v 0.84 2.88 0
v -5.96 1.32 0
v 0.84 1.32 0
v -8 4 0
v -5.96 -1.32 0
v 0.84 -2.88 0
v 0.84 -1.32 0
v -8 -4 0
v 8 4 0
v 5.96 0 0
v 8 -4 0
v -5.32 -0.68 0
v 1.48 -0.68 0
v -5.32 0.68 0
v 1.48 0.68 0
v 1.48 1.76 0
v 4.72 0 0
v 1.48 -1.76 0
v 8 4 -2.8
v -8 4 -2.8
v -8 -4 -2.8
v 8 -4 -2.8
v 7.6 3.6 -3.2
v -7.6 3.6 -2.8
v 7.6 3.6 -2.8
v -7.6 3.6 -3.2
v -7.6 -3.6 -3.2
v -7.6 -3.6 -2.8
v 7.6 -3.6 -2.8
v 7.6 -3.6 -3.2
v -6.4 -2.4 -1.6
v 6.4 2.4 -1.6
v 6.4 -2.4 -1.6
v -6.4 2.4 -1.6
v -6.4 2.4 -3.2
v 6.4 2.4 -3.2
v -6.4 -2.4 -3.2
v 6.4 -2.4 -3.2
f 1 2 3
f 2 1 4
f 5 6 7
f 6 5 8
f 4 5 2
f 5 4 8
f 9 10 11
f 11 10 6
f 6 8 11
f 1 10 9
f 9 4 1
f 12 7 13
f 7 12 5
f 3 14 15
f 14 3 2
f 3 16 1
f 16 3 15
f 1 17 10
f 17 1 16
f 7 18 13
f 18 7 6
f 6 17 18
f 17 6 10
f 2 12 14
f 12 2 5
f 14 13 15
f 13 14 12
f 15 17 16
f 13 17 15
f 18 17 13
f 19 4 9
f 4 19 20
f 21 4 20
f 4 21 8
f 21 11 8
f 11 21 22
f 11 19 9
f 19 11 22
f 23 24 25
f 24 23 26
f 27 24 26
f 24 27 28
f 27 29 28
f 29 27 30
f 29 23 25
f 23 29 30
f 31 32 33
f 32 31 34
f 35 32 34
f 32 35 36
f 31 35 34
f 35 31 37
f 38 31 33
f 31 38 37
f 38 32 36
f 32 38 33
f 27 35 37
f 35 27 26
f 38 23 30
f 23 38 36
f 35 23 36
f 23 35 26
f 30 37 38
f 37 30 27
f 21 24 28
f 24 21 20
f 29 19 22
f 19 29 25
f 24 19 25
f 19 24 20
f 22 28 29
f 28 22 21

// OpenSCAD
// file: ../p/box5.scad
use <../lib.scad>
function ldraw_lib__box5() = [
// 0 Box with 5 Faces and All Edges
// 0 Name: box5.dat
// 0 Author: James Jessiman
// 0 !LDRAW_ORG Primitive UPDATE 2012-01
// 0 !LICENSE Licensed under CC BY 4.0 : see CAreadme.txt
// 
// 0 BFC CERTIFY CCW
  [0,"BFC","CERTIFY"],
  [0,"BFC","CCW"],
// 
// 0 !HISTORY 2002-04-03 [sbliss] Modified for BFC compliance
// 0 !HISTORY 2002-04-25 [PTadmin] Official Update 2002-02
// 0 !HISTORY 2007-06-24 [PTadmin] Header formatted for Contributor Agreement
// 0 !HISTORY 2008-07-01 [PTadmin] Official Update 2008-01
// 0 !HISTORY 2012-02-16 [Philo] Changed to CCW
// 0 !HISTORY 2012-03-30 [PTadmin] Official Update 2012-01
// 
// 
// 2 24 1 1 1 -1 1 1
  [2,24,1,1,1,-1,1,1],
// 2 24 -1 1 1 -1 1 -1
  [2,24,-1,1,1,-1,1,-1],
// 2 24 -1 1 -1 1 1 -1
  [2,24,-1,1,-1,1,1,-1],
// 2 24 1 1 -1 1 1 1
  [2,24,1,1,-1,1,1,1],
// 2 24 1 0 1 -1 0 1
  [2,24,1,0,1,-1,0,1],
// 2 24 -1 0 1 -1 0 -1
  [2,24,-1,0,1,-1,0,-1],
// 2 24 -1 0 -1 1 0 -1
  [2,24,-1,0,-1,1,0,-1],
// 2 24 1 0 -1 1 0 1
  [2,24,1,0,-1,1,0,1],
// 2 24 1 0 1 1 1 1
  [2,24,1,0,1,1,1,1],
// 2 24 -1 0 1 -1 1 1
  [2,24,-1,0,1,-1,1,1],
// 2 24 1 0 -1 1 1 -1
  [2,24,1,0,-1,1,1,-1],
// 2 24 -1 0 -1 -1 1 -1
  [2,24,-1,0,-1,-1,1,-1],
// 4 16 -1 1 1 1 1 1 1 1 -1 -1 1 -1
  [4,16,-1,1,1,1,1,1,1,1,-1,-1,1,-1],
// 4 16 -1 1 1 -1 0 1 1 0 1 1 1 1
  [4,16,-1,1,1,-1,0,1,1,0,1,1,1,1],
// 4 16 -1 1 -1 -1 0 -1 -1 0 1 -1 1 1
  [4,16,-1,1,-1,-1,0,-1,-1,0,1,-1,1,1],
// 4 16 1 1 -1 1 0 -1 -1 0 -1 -1 1 -1
  [4,16,1,1,-1,1,0,-1,-1,0,-1,-1,1,-1],
// 4 16 1 1 1 1 0 1 1 0 -1 1 1 -1
  [4,16,1,1,1,1,0,1,1,0,-1,1,1,-1],
];
module ldraw_lib__box5(step=0, col=false, unit=2/5, alt=false, line=0.2, solid=!$preview)
    makepoly(ldraw_lib__box5(), step=step, col=col, unit=unit, alt=alt, line=line, solid=solid);
ldraw_lib__box5(line=0.2);
// file: ../p/box4.scad
use <../lib.scad>
function ldraw_lib__box4() = [
// 0 Box with 4 Faces (2 Parallel Pairs) and All Edges
// 0 Name: box4.dat
// 0 Author: James Jessiman
// 0 !LDRAW_ORG Primitive UPDATE 2012-01
// 0 !LICENSE Licensed under CC BY 4.0 : see CAreadme.txt
// 
// 0 BFC CERTIFY CCW
  [0,"BFC","CERTIFY"],
  [0,"BFC","CCW"],
// 
// 0 !HISTORY 2002-04-03 [sbliss] Modified for BFC compliance
// 0 !HISTORY 2002-04-25 [PTadmin] Official Update 2002-02
// 0 !HISTORY 2007-06-24 [PTadmin] Header formatted for Contributor Agreement
// 0 !HISTORY 2008-07-01 [PTadmin] Official Update 2008-01
// 0 !HISTORY 2012-02-16 [Philo] Changed to CCW
// 0 !HISTORY 2012-03-30 [PTadmin] Official Update 2012-01
// 
// 
// 2 24 1 1 1 -1 1 1
  [2,24,1,1,1,-1,1,1],
// 2 24 -1 1 1 -1 1 -1
  [2,24,-1,1,1,-1,1,-1],
// 2 24 -1 1 -1 1 1 -1
  [2,24,-1,1,-1,1,1,-1],
// 2 24 1 1 -1 1 1 1
  [2,24,1,1,-1,1,1,1],
// 2 24 1 0 1 -1 0 1
  [2,24,1,0,1,-1,0,1],
// 2 24 -1 0 1 -1 0 -1
  [2,24,-1,0,1,-1,0,-1],
// 2 24 -1 0 -1 1 0 -1
  [2,24,-1,0,-1,1,0,-1],
// 2 24 1 0 -1 1 0 1
  [2,24,1,0,-1,1,0,1],
// 2 24 1 0 1 1 1 1
  [2,24,1,0,1,1,1,1],
// 2 24 -1 0 1 -1 1 1
  [2,24,-1,0,1,-1,1,1],
// 2 24 1 0 -1 1 1 -1
  [2,24,1,0,-1,1,1,-1],
// 2 24 -1 0 -1 -1 1 -1
  [2,24,-1,0,-1,-1,1,-1],
// 4 16 -1 1 1 -1 0 1 1 0 1 1 1 1
  [4,16,-1,1,1,-1,0,1,1,0,1,1,1,1],
// 4 16 -1 1 -1 -1 0 -1 -1 0 1 -1 1 1
  [4,16,-1,1,-1,-1,0,-1,-1,0,1,-1,1,1],
// 4 16 1 1 -1 1 0 -1 -1 0 -1 -1 1 -1
  [4,16,1,1,-1,1,0,-1,-1,0,-1,-1,1,-1],
// 4 16 1 1 1 1 0 1 1 0 -1 1 1 -1
  [4,16,1,1,1,1,0,1,1,0,-1,1,1,-1],
];
module ldraw_lib__box4(step=0, col=false, unit=2/5, alt=false, line=0.2, solid=!$preview)
    makepoly(ldraw_lib__box4(), step=step, col=col, unit=unit, alt=alt, line=line, solid=solid);
ldraw_lib__box4(line=0.2);
// file: s/3069p06c.scad
use <../../lib.scad>
function ldraw_lib__s__3069p06c() = [
// 0 ~Tile  1 x  2 with Arrow Long Pattern (Arrow)
// 0 Name: s\3069p06c.dat
// 0 Author: William Howard [WilliamH]
// 0 !LDRAW_ORG Subpart UPDATE 2009-03
// 0 !LICENSE Licensed under CC BY 2.0 and CC BY 4.0 : see CAreadme.txt
// 
// 0 BFC CERTIFY CCW
  [0,"BFC","CERTIFY"],
  [0,"BFC","CCW"],
// 
// 0 !HISTORY 2009-05-02 [PTadmin] Official Update 2009-01
// 0 !HISTORY 2009-08-18 [anathema] Improved pattern
// 0 !HISTORY 2009-12-29 [PTadmin] Official Update 2009-03
// 
// 
// 4 16 -13.3 0 -1.7 3.7 0 -1.7 3.7 0 1.7 -13.3 0 1.7
  [4,16,-13.3,0,-1.7,3.7,0,-1.7,3.7,0,1.7,-13.3,0,1.7],
// 3 16 3.7 0 1.7 11.8 0 0 3.7 0 4.4
  [3,16,3.7,0,1.7,11.8,0,0,3.7,0,4.4],
// 3 16 3.7 0 -1.7 11.8 0 0 3.7 0 1.7
  [3,16,3.7,0,-1.7,11.8,0,0,3.7,0,1.7],
// 3 16 3.7 0 -4.4 11.8 0 0 3.7 0 -1.7
  [3,16,3.7,0,-4.4,11.8,0,0,3.7,0,-1.7],
// 0
];
module ldraw_lib__s__3069p06c(step=0, col=false, unit=2/5, alt=false, line=0.2, solid=!$preview)
    makepoly(ldraw_lib__s__3069p06c(), step=step, col=col, unit=unit, alt=alt, line=line, solid=solid);
ldraw_lib__s__3069p06c(line=0.2);
// file: s/3069p06b.scad
use <../../lib.scad>
function ldraw_lib__s__3069p06b() = [
// 0 ~Tile  1 x  2 with Arrow Long Pattern (Border)
// 0 Name: s\3069p06b.dat
// 0 Author: William Howard [WilliamH]
// 0 !LDRAW_ORG Subpart UPDATE 2009-03
// 0 !LICENSE Licensed under CC BY 2.0 and CC BY 4.0 : see CAreadme.txt
// 
// 0 BFC CERTIFY CCW
  [0,"BFC","CERTIFY"],
  [0,"BFC","CCW"],
// 
// 0 !HISTORY 2009-05-02 [PTadmin] Official Update 2009-01
// 0 !HISTORY 2009-08-18 [anathema] Improved pattern
// 0 !HISTORY 2009-10-09 [cwdee] Corrected small overlap
// 0 !HISTORY 2009-12-29 [PTadmin] Official Update 2009-03
// 
// 
// 4 16 -14.9 0 -3.3 2.1 0 -3.3 3.7 0 -1.7 -13.3 0 -1.7
  [4,16,-14.9,0,-3.3,2.1,0,-3.3,3.7,0,-1.7,-13.3,0,-1.7],
// 4 16 -13.3 0 1.7 3.7 0 1.7 2.1 0 3.3 -14.9 0 3.3
  [4,16,-13.3,0,1.7,3.7,0,1.7,2.1,0,3.3,-14.9,0,3.3],
// 4 16 2.1 0 7.2 2.1 0 3.3 3.7 0 1.7 3.7 0 4.4
  [4,16,2.1,0,7.2,2.1,0,3.3,3.7,0,1.7,3.7,0,4.4],
// 4 16 3.7 0 4.4 11.8 0 0 14.9 0 0 2.1 0 7.2
  [4,16,3.7,0,4.4,11.8,0,0,14.9,0,0,2.1,0,7.2],
// 4 16 3.7 0 -4.4 3.7 0 -1.7 2.1 0 -3.3 2.1 0 -7.2
  [4,16,3.7,0,-4.4,3.7,0,-1.7,2.1,0,-3.3,2.1,0,-7.2],
// 4 16 2.1 0 -7.2 14.9 0 0 11.8 0 0 3.7 0 -4.4
  [4,16,2.1,0,-7.2,14.9,0,0,11.8,0,0,3.7,0,-4.4],
// 4 16 -14.9 0 3.3 -14.9 0 -3.3 -13.3 0 -1.7 -13.3 0 1.7
  [4,16,-14.9,0,3.3,-14.9,0,-3.3,-13.3,0,-1.7,-13.3,0,1.7],
// 0
];
module ldraw_lib__s__3069p06b(step=0, col=false, unit=2/5, alt=false, line=0.2, solid=!$preview)
    makepoly(ldraw_lib__s__3069p06b(), step=step, col=col, unit=unit, alt=alt, line=line, solid=solid);
ldraw_lib__s__3069p06b(line=0.2);
// file: s/3069p06a.scad
use <../../lib.scad>
function ldraw_lib__s__3069p06a() = [
// 0 ~Tile  1 x  2 with Arrow Long Pattern (Mask)
// 0 Name: s\3069p06a.dat
// 0 Author: William Howard [WilliamH]
// 0 !LDRAW_ORG Subpart UPDATE 2009-03
// 0 !LICENSE Licensed under CC BY 2.0 and CC BY 4.0 : see CAreadme.txt
// 
// 0 BFC CERTIFY CCW
  [0,"BFC","CERTIFY"],
  [0,"BFC","CCW"],
// 
// 0 !HISTORY 2009-05-02 [PTadmin] Official Update 2009-01
// 0 !HISTORY 2009-08-18 [anathema] Improved pattern
// 0 !HISTORY 2009-12-29 [PTadmin] Official Update 2009-03
// 
// 
// 4 16 -14.9 0 3.3 2.1 0 3.3 2.1 0 7.2 -20 0 10
  [4,16,-14.9,0,3.3,2.1,0,3.3,2.1,0,7.2,-20,0,10],
// 4 16 -20 0 -10 2.1 0 -7.2 2.1 0 -3.3 -14.9 0 -3.3
  [4,16,-20,0,-10,2.1,0,-7.2,2.1,0,-3.3,-14.9,0,-3.3],
// 4 16 -20 0 10 -20 0 -10 -14.9 0 -3.3 -14.9 0 3.3
  [4,16,-20,0,10,-20,0,-10,-14.9,0,-3.3,-14.9,0,3.3],
// 3 16 20 0 10 14.9 0 0 20 0 -10
  [3,16,20,0,10,14.9,0,0,20,0,-10],
// 3 16 20 0 -10 14.9 0 0 2.1 0 -7.2
  [3,16,20,0,-10,14.9,0,0,2.1,0,-7.2],
// 3 16 2.1 0 -7.2 -20 0 -10 20 0 -10
  [3,16,2.1,0,-7.2,-20,0,-10,20,0,-10],
// 3 16 2.1 0 7.2 14.9 0 0 20 0 10
  [3,16,2.1,0,7.2,14.9,0,0,20,0,10],
// 3 16 20 0 10 -20 0 10 2.1 0 7.2
  [3,16,20,0,10,-20,0,10,2.1,0,7.2],
// 0
];
module ldraw_lib__s__3069p06a(step=0, col=false, unit=2/5, alt=false, line=0.2, solid=!$preview)
    makepoly(ldraw_lib__s__3069p06a(), step=step, col=col, unit=unit, alt=alt, line=line, solid=solid);
ldraw_lib__s__3069p06a(line=0.2);
// file: s/3069bs01.scad
use <../../lib.scad>
use <../../p/box4.scad>
use <../../p/box5.scad>
function ldraw_lib__s__3069bs01() = [
// 0 ~Tile  1 x  2 with Groove without Top Face
// 0 Name: s\3069bs01.dat
// 0 Author: Santeri Piippo [arezey]
// 0 !LDRAW_ORG Subpart UPDATE 2010-02
// 0 !LICENSE Licensed under CC BY 4.0 : see CAreadme.txt
// 
// 0 BFC CERTIFY CCW
  [0,"BFC","CERTIFY"],
  [0,"BFC","CCW"],
// 
// 0 !HISTORY 2010-07-05 [PTadmin] Official Update 2010-02
// 
// 
// 1 16 0 0 0 20 0 0 0 7 0 0 0 10 box4.dat
  [1,16,0,0,0,20,0,0,0,7,0,0,0,10, ldraw_lib__box4()],
// 1 16 0 7 0 19 0 0 0 1 0 0 0 9 box4.dat
  [1,16,0,7,0,19,0,0,0,1,0,0,0,9, ldraw_lib__box4()],
// 0 BFC INVERTNEXT
  [0,"BFC","INVERTNEXT"],
// 1 16 0 8 0 16 0 0 0 -4 0 0 0 6 box5.dat
  [1,16,0,8,0,16,0,0,0,-4,0,0,0,6, ldraw_lib__box5()],
// 4 16 -19 8 9 -16 8 6 -16 8 -6 -19 8 -9
  [4,16,-19,8,9,-16,8,6,-16,8,-6,-19,8,-9],
// 4 16 19 8 -9 16 8 -6 16 8 6 19 8 9
  [4,16,19,8,-9,16,8,-6,16,8,6,19,8,9],
// 4 16 19 8 9 16 8 6 -16 8 6 -19 8 9
  [4,16,19,8,9,16,8,6,-16,8,6,-19,8,9],
// 4 16 -19 8 -9 -16 8 -6 16 8 -6 19 8 -9
  [4,16,-19,8,-9,-16,8,-6,16,8,-6,19,8,-9],
// 4 16 -20 7 10 -19 7 9 -19 7 -9 -20 7 -10
  [4,16,-20,7,10,-19,7,9,-19,7,-9,-20,7,-10],
// 4 16 20 7 -10 19 7 -9 19 7 9 20 7 10
  [4,16,20,7,-10,19,7,-9,19,7,9,20,7,10],
// 4 16 20 7 10 19 7 9 -19 7 9 -20 7 10
  [4,16,20,7,10,19,7,9,-19,7,9,-20,7,10],
// 4 16 -20 7 -10 -19 7 -9 19 7 -9 20 7 -10
  [4,16,-20,7,-10,-19,7,-9,19,7,-9,20,7,-10],
// 0 //
];
module ldraw_lib__s__3069bs01(step=0, col=false, unit=2/5, alt=false, line=0.2, solid=!$preview)
    makepoly(ldraw_lib__s__3069bs01(), step=step, col=col, unit=unit, alt=alt, line=line, solid=solid);
ldraw_lib__s__3069bs01(line=0.2);
// main file
use <../lib.scad>
use <s/3069bs01.scad>
use <s/3069p06a.scad>
use <s/3069p06b.scad>
use <s/3069p06c.scad>
function ldraw_lib__3069bp06() = [
// 0 Tile  1 x  2 with Arrow Long Yellow with Black Border Pattern
// 0 Name: 3069bp06.dat
// 0 Author: James Jessiman
// 0 !LDRAW_ORG Part UPDATE 2009-03
// 0 !LICENSE Licensed under CC BY 4.0 : see CAreadme.txt
// 
// 0 BFC CERTIFY CCW
  [0,"BFC","CERTIFY"],
  [0,"BFC","CCW"],
// 
// 0 !KEYWORDS BrickLink 3069p06, Rebrickable 3069bpr0023, Set 6381
// 
// 0 !HISTORY 2002-01-17 {Bram Lambrecht} improved version
// 0 !HISTORY 2002-02-18 [PTadmin] Official Update 2002-01
// 0 !HISTORY 2003-06-08 [jriley] BFC compliant
// 0 !HISTORY 2003-12-19 [PTadmin] Official Update 2003-03
// 0 !HISTORY 2007-06-13 [PTadmin] Header formatted for Contributor Agreement
// 0 !HISTORY 2008-07-01 [PTadmin] Official Update 2008-01
// 0 !HISTORY 2008-07-07 [WilliamH] Sub-parted
// 0 !HISTORY 2008-12-16 [anathema] Reinstated missing subpart
// 0 !HISTORY 2009-05-02 [PTadmin] Official Update 2009-01
// 0 !HISTORY 2009-08-19 [anathema] Changed description
// 0 !HISTORY 2009-12-29 [PTadmin] Official Update 2009-03
// 
// 
// 1 16 0 0 0 1 0 0 0 1 0 0 0 1 s\3069p06a.dat
  [1,16,0,0,0,1,0,0,0,1,0,0,0,1, ldraw_lib__s__3069p06a()],
// 1 0 0 0 0 1 0 0 0 1 0 0 0 1 s\3069p06b.dat
  [1,0,0,0,0,1,0,0,0,1,0,0,0,1, ldraw_lib__s__3069p06b()],
// 1 14 0 0 0 1 0 0 0 1 0 0 0 1 s\3069p06c.dat
  [1,14,0,0,0,1,0,0,0,1,0,0,0,1, ldraw_lib__s__3069p06c()],
// 1 16 0 0 0 1 0 0 0 1 0 0 0 1 s\3069bs01.dat
  [1,16,0,0,0,1,0,0,0,1,0,0,0,1, ldraw_lib__s__3069bs01()],
// 0
];
module ldraw_lib__3069bp06(step=0, col=false, unit=2/5, alt=false, line=0.2, solid=!$preview)
    makepoly(ldraw_lib__3069bp06(), step=step, col=col, unit=unit, alt=alt, line=line, solid=solid);
ldraw_lib__3069bp06(line=0.2);
